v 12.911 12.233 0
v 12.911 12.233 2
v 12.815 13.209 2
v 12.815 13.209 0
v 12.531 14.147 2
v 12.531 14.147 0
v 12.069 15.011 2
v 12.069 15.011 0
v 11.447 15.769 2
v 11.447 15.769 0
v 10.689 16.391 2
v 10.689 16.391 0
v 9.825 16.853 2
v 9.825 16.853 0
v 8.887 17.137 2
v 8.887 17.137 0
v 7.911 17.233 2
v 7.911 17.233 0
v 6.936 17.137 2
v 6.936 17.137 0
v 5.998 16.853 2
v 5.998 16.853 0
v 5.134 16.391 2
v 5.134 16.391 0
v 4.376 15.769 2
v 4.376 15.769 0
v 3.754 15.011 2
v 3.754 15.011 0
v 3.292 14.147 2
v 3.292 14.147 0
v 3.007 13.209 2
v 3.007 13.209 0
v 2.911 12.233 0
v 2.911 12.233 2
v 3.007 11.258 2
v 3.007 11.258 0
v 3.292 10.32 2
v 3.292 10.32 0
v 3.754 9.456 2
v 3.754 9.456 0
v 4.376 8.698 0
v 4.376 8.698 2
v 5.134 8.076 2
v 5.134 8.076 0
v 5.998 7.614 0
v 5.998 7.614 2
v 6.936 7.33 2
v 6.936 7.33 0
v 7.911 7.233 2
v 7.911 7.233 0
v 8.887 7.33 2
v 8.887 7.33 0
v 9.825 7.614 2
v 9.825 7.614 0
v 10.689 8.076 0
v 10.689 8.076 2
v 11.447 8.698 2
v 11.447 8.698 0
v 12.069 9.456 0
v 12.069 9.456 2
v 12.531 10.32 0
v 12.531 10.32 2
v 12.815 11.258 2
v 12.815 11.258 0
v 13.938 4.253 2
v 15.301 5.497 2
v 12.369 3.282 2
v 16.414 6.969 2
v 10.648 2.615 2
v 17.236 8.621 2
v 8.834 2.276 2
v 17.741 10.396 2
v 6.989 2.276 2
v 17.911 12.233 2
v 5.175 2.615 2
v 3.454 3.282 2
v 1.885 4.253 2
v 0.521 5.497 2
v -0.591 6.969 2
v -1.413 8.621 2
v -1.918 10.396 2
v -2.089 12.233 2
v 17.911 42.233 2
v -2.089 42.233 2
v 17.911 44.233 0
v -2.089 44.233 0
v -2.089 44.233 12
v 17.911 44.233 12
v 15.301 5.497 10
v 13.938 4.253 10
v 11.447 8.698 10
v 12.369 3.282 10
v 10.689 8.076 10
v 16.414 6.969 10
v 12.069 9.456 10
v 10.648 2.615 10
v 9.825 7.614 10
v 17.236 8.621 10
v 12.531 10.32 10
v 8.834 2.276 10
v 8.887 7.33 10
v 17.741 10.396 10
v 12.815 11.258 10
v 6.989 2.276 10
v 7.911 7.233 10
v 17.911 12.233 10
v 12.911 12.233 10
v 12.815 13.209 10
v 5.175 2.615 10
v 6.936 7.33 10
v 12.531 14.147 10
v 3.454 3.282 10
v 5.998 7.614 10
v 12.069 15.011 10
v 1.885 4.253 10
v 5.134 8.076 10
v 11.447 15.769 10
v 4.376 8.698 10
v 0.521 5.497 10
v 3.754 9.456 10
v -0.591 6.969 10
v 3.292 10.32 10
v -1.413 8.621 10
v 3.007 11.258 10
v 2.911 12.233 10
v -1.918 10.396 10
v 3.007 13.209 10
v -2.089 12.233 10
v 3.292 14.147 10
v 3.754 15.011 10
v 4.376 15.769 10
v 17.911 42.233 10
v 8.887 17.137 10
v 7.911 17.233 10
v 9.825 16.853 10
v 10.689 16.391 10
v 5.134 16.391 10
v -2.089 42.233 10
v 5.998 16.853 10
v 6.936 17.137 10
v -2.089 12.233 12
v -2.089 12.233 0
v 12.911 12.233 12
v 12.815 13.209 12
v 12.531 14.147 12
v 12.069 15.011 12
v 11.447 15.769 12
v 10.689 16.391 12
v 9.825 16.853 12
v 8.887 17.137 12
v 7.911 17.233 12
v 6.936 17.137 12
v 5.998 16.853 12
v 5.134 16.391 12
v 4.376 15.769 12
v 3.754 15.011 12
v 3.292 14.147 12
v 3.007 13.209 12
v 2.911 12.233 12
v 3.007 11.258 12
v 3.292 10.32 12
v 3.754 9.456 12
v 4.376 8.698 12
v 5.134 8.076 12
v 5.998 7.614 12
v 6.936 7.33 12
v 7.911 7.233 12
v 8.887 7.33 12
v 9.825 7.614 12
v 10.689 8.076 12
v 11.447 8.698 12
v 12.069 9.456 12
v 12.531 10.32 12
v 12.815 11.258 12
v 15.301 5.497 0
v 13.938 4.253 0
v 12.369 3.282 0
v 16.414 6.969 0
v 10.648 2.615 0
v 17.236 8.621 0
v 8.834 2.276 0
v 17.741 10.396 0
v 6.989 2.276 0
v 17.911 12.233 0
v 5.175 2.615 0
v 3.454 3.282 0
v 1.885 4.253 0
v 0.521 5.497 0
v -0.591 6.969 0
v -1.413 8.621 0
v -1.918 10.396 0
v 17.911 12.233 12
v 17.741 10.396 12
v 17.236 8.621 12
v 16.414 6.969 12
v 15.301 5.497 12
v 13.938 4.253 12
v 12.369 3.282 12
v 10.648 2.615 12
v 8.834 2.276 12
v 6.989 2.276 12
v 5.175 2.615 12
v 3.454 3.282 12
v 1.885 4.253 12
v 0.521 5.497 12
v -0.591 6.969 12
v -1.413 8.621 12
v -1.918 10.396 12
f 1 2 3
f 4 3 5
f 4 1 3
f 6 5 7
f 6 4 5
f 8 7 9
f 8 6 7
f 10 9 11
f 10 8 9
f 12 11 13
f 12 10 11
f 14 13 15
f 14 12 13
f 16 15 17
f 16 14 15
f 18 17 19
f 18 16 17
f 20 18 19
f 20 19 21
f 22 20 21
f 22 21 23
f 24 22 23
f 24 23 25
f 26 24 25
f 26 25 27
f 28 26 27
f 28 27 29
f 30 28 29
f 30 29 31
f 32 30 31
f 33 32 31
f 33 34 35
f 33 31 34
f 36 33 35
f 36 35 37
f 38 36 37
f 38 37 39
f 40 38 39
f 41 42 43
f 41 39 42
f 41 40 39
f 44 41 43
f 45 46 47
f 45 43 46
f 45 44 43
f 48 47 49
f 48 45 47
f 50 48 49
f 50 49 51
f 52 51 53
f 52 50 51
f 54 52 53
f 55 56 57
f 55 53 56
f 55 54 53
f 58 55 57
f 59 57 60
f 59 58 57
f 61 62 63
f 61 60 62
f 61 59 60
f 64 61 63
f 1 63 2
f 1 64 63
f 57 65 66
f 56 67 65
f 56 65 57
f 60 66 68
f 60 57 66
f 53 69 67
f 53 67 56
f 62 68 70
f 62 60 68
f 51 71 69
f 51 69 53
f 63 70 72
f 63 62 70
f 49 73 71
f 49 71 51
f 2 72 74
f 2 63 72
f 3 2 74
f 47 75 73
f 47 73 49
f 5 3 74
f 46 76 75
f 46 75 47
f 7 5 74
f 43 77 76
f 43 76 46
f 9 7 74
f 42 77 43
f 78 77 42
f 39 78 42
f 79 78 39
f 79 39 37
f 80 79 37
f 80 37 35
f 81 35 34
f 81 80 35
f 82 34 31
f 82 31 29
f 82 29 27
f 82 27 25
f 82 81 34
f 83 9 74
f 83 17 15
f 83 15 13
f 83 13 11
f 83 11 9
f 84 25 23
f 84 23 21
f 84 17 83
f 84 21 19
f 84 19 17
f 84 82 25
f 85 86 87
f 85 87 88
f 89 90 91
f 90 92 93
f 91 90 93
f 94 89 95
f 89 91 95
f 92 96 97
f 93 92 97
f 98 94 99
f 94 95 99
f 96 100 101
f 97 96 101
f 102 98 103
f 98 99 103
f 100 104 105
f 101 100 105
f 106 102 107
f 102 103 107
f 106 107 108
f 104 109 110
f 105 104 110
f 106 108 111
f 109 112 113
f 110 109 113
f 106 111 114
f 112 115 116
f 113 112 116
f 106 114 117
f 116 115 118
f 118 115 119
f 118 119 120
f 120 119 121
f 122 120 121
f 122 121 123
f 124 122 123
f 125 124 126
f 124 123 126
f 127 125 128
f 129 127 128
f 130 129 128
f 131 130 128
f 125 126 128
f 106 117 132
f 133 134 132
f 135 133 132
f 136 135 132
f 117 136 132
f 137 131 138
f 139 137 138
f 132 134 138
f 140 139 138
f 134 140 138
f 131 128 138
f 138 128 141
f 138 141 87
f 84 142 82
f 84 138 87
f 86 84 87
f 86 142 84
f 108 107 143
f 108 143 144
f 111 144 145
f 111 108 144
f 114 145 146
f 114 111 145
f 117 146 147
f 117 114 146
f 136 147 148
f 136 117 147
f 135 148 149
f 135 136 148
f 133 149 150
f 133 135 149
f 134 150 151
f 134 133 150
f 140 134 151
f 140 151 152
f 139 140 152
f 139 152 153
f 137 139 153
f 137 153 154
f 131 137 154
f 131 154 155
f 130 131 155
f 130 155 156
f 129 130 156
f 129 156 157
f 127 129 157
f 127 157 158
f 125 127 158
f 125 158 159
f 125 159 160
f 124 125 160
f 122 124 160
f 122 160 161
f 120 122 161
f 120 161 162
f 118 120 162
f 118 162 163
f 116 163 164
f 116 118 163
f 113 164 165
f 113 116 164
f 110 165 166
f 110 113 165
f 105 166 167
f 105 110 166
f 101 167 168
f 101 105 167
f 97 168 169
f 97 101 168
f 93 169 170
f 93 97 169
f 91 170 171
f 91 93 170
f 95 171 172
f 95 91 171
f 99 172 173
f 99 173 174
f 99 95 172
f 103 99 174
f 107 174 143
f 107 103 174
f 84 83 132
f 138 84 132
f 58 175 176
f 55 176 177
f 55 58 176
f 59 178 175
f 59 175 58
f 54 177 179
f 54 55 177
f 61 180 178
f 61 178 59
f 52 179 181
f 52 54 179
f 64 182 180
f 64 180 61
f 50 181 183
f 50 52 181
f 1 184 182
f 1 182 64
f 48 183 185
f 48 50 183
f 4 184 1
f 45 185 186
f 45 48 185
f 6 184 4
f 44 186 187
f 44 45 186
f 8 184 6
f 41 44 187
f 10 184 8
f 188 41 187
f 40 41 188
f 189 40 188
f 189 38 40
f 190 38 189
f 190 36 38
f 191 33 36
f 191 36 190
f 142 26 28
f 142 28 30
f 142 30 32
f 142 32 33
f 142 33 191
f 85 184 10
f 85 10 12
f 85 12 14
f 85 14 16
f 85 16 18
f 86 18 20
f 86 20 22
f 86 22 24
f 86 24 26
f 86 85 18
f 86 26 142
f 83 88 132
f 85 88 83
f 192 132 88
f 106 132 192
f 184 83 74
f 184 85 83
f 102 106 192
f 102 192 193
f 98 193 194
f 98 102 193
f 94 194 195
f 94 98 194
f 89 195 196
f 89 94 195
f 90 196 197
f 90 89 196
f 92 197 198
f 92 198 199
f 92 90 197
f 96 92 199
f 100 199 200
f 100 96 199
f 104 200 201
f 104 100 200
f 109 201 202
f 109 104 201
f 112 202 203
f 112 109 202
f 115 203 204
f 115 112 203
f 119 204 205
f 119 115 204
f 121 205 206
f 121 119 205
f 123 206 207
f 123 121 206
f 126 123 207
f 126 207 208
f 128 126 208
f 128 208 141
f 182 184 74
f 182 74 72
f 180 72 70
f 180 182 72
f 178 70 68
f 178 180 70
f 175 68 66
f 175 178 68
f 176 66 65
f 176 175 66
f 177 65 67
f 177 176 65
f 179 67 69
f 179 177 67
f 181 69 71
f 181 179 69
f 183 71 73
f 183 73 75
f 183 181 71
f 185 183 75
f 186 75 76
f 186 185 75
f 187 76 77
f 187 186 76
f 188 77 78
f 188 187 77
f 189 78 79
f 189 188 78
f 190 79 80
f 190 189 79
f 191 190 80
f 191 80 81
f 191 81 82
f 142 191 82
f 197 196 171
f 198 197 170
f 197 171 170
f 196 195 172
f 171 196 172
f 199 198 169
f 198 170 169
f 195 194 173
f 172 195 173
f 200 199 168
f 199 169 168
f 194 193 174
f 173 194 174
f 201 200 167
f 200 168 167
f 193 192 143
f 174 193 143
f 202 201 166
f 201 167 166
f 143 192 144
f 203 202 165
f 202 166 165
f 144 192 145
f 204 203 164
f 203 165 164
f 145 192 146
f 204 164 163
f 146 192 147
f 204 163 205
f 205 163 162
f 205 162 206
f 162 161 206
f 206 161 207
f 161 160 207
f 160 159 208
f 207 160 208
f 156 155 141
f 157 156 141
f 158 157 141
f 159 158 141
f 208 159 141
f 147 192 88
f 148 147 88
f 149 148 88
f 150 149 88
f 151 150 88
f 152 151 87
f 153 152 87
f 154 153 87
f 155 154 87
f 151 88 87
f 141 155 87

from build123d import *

# Parameters (mm, degrees)
SKETCH1_R           = 5
BOSS_EXTRUDE1_DEPTH = 12
CUT_EXTRUDE1_REACH  = 52.006
SKETCH2_W           = 8
SKETCH2_H           = 42.233489427


with BuildPart() as part:
    # Sketch1 → Boss-Extrude1 (new body)
    with BuildSketch(Plane.XY):
        with BuildLine():
            Line((-2.088637096, 12.233489427), (-2.088637096, 44.233489427))
            Line((-2.088637096, 44.233489427), (17.911362904, 44.233489427))
            Line((17.911362904, 44.233489427), (17.911362904, 12.233489427))
            ThreePointArc((17.911362904, 12.233489427), (7.911362904, 2.233489427), (-2.088637096, 12.233489427))
        make_face()
        with Locations((7.911362904, 12.233489427)):
            Circle(SKETCH1_R, mode=Mode.SUBTRACT)
    extrude(amount=BOSS_EXTRUDE1_DEPTH)

    # Cut-Extrude1: up to this face of the body (flat: up to its plane)
    cut_extrude1_end = Plane(part.part.faces().sort_by_distance((17.911362904, 28.233489427, 6))[0])
    # Sketch2 → Cut-Extrude1 (cut, up to the picked face)
    with BuildSketch(Plane.ZY.offset(2.088637096), mode=Mode.PRIVATE) as cut_extrude1_sk1:
        with Locations((6, 21.116744714)):
            Rectangle(SKETCH2_W, SKETCH2_H)
    cut_extrude1_tool1 = split(extrude(cut_extrude1_sk1.sketch, amount=-CUT_EXTRUDE1_REACH, mode=Mode.PRIVATE), bisect_by=cut_extrude1_end, keep=Keep.BOTH, mode=Mode.PRIVATE)
    add(cut_extrude1_tool1.solids().sort_by(Axis((-2.088637, 21.116745, 6), (1, 0, 0)))[0], mode=Mode.SUBTRACT)


solid = part.part
